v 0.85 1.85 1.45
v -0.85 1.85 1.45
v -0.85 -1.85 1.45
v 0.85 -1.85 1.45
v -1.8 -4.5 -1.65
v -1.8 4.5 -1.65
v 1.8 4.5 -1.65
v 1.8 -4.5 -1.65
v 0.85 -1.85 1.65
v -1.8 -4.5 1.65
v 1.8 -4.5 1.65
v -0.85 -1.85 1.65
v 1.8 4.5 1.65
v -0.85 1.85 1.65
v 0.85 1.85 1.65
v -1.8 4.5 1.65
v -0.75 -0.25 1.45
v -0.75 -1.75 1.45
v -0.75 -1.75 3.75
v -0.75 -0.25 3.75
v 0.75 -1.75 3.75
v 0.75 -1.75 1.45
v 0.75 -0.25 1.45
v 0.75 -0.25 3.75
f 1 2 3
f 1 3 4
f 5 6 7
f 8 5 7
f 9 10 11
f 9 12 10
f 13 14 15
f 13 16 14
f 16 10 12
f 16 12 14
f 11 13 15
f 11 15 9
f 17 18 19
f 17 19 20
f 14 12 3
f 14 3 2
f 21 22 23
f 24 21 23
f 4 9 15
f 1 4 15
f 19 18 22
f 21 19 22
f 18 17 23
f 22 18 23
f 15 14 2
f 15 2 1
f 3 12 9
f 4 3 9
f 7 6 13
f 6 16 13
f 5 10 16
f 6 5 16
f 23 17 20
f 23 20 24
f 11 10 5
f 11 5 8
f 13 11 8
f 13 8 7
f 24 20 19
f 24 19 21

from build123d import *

# Parameters (mm, degrees)
F0_W     = 3.6
F0_H     = 9
F1_DEPTH = 1.65
F2_W     = 1.7
F2_H     = 3.7
F3_DEPTH = 0.2
F4_W     = 1.5
F4_H     = 1.5
F5_DEPTH = 2.3


with BuildPart() as f1:
    # F0 (on Top) → F1 (new body, symmetric)
    with BuildSketch(Plane.XY):
        Rectangle(F0_W, F0_H)
    extrude(amount=F1_DEPTH, both=True)

    # F2 (on face) → F3 (cut)
    with BuildSketch(Plane.XY.offset(1.65)):
        Rectangle(F2_W, F2_H)
    extrude(amount=-F3_DEPTH, mode=Mode.SUBTRACT)


with BuildPart() as f5:
    # F4 (on face) → F5 (new body)
    with BuildSketch(Plane.XY.offset(1.45)):
        with Locations((0, -1)):
            Rectangle(F4_W, F4_H)
    extrude(amount=F5_DEPTH)


solid = Compound([f1.part, f5.part])
